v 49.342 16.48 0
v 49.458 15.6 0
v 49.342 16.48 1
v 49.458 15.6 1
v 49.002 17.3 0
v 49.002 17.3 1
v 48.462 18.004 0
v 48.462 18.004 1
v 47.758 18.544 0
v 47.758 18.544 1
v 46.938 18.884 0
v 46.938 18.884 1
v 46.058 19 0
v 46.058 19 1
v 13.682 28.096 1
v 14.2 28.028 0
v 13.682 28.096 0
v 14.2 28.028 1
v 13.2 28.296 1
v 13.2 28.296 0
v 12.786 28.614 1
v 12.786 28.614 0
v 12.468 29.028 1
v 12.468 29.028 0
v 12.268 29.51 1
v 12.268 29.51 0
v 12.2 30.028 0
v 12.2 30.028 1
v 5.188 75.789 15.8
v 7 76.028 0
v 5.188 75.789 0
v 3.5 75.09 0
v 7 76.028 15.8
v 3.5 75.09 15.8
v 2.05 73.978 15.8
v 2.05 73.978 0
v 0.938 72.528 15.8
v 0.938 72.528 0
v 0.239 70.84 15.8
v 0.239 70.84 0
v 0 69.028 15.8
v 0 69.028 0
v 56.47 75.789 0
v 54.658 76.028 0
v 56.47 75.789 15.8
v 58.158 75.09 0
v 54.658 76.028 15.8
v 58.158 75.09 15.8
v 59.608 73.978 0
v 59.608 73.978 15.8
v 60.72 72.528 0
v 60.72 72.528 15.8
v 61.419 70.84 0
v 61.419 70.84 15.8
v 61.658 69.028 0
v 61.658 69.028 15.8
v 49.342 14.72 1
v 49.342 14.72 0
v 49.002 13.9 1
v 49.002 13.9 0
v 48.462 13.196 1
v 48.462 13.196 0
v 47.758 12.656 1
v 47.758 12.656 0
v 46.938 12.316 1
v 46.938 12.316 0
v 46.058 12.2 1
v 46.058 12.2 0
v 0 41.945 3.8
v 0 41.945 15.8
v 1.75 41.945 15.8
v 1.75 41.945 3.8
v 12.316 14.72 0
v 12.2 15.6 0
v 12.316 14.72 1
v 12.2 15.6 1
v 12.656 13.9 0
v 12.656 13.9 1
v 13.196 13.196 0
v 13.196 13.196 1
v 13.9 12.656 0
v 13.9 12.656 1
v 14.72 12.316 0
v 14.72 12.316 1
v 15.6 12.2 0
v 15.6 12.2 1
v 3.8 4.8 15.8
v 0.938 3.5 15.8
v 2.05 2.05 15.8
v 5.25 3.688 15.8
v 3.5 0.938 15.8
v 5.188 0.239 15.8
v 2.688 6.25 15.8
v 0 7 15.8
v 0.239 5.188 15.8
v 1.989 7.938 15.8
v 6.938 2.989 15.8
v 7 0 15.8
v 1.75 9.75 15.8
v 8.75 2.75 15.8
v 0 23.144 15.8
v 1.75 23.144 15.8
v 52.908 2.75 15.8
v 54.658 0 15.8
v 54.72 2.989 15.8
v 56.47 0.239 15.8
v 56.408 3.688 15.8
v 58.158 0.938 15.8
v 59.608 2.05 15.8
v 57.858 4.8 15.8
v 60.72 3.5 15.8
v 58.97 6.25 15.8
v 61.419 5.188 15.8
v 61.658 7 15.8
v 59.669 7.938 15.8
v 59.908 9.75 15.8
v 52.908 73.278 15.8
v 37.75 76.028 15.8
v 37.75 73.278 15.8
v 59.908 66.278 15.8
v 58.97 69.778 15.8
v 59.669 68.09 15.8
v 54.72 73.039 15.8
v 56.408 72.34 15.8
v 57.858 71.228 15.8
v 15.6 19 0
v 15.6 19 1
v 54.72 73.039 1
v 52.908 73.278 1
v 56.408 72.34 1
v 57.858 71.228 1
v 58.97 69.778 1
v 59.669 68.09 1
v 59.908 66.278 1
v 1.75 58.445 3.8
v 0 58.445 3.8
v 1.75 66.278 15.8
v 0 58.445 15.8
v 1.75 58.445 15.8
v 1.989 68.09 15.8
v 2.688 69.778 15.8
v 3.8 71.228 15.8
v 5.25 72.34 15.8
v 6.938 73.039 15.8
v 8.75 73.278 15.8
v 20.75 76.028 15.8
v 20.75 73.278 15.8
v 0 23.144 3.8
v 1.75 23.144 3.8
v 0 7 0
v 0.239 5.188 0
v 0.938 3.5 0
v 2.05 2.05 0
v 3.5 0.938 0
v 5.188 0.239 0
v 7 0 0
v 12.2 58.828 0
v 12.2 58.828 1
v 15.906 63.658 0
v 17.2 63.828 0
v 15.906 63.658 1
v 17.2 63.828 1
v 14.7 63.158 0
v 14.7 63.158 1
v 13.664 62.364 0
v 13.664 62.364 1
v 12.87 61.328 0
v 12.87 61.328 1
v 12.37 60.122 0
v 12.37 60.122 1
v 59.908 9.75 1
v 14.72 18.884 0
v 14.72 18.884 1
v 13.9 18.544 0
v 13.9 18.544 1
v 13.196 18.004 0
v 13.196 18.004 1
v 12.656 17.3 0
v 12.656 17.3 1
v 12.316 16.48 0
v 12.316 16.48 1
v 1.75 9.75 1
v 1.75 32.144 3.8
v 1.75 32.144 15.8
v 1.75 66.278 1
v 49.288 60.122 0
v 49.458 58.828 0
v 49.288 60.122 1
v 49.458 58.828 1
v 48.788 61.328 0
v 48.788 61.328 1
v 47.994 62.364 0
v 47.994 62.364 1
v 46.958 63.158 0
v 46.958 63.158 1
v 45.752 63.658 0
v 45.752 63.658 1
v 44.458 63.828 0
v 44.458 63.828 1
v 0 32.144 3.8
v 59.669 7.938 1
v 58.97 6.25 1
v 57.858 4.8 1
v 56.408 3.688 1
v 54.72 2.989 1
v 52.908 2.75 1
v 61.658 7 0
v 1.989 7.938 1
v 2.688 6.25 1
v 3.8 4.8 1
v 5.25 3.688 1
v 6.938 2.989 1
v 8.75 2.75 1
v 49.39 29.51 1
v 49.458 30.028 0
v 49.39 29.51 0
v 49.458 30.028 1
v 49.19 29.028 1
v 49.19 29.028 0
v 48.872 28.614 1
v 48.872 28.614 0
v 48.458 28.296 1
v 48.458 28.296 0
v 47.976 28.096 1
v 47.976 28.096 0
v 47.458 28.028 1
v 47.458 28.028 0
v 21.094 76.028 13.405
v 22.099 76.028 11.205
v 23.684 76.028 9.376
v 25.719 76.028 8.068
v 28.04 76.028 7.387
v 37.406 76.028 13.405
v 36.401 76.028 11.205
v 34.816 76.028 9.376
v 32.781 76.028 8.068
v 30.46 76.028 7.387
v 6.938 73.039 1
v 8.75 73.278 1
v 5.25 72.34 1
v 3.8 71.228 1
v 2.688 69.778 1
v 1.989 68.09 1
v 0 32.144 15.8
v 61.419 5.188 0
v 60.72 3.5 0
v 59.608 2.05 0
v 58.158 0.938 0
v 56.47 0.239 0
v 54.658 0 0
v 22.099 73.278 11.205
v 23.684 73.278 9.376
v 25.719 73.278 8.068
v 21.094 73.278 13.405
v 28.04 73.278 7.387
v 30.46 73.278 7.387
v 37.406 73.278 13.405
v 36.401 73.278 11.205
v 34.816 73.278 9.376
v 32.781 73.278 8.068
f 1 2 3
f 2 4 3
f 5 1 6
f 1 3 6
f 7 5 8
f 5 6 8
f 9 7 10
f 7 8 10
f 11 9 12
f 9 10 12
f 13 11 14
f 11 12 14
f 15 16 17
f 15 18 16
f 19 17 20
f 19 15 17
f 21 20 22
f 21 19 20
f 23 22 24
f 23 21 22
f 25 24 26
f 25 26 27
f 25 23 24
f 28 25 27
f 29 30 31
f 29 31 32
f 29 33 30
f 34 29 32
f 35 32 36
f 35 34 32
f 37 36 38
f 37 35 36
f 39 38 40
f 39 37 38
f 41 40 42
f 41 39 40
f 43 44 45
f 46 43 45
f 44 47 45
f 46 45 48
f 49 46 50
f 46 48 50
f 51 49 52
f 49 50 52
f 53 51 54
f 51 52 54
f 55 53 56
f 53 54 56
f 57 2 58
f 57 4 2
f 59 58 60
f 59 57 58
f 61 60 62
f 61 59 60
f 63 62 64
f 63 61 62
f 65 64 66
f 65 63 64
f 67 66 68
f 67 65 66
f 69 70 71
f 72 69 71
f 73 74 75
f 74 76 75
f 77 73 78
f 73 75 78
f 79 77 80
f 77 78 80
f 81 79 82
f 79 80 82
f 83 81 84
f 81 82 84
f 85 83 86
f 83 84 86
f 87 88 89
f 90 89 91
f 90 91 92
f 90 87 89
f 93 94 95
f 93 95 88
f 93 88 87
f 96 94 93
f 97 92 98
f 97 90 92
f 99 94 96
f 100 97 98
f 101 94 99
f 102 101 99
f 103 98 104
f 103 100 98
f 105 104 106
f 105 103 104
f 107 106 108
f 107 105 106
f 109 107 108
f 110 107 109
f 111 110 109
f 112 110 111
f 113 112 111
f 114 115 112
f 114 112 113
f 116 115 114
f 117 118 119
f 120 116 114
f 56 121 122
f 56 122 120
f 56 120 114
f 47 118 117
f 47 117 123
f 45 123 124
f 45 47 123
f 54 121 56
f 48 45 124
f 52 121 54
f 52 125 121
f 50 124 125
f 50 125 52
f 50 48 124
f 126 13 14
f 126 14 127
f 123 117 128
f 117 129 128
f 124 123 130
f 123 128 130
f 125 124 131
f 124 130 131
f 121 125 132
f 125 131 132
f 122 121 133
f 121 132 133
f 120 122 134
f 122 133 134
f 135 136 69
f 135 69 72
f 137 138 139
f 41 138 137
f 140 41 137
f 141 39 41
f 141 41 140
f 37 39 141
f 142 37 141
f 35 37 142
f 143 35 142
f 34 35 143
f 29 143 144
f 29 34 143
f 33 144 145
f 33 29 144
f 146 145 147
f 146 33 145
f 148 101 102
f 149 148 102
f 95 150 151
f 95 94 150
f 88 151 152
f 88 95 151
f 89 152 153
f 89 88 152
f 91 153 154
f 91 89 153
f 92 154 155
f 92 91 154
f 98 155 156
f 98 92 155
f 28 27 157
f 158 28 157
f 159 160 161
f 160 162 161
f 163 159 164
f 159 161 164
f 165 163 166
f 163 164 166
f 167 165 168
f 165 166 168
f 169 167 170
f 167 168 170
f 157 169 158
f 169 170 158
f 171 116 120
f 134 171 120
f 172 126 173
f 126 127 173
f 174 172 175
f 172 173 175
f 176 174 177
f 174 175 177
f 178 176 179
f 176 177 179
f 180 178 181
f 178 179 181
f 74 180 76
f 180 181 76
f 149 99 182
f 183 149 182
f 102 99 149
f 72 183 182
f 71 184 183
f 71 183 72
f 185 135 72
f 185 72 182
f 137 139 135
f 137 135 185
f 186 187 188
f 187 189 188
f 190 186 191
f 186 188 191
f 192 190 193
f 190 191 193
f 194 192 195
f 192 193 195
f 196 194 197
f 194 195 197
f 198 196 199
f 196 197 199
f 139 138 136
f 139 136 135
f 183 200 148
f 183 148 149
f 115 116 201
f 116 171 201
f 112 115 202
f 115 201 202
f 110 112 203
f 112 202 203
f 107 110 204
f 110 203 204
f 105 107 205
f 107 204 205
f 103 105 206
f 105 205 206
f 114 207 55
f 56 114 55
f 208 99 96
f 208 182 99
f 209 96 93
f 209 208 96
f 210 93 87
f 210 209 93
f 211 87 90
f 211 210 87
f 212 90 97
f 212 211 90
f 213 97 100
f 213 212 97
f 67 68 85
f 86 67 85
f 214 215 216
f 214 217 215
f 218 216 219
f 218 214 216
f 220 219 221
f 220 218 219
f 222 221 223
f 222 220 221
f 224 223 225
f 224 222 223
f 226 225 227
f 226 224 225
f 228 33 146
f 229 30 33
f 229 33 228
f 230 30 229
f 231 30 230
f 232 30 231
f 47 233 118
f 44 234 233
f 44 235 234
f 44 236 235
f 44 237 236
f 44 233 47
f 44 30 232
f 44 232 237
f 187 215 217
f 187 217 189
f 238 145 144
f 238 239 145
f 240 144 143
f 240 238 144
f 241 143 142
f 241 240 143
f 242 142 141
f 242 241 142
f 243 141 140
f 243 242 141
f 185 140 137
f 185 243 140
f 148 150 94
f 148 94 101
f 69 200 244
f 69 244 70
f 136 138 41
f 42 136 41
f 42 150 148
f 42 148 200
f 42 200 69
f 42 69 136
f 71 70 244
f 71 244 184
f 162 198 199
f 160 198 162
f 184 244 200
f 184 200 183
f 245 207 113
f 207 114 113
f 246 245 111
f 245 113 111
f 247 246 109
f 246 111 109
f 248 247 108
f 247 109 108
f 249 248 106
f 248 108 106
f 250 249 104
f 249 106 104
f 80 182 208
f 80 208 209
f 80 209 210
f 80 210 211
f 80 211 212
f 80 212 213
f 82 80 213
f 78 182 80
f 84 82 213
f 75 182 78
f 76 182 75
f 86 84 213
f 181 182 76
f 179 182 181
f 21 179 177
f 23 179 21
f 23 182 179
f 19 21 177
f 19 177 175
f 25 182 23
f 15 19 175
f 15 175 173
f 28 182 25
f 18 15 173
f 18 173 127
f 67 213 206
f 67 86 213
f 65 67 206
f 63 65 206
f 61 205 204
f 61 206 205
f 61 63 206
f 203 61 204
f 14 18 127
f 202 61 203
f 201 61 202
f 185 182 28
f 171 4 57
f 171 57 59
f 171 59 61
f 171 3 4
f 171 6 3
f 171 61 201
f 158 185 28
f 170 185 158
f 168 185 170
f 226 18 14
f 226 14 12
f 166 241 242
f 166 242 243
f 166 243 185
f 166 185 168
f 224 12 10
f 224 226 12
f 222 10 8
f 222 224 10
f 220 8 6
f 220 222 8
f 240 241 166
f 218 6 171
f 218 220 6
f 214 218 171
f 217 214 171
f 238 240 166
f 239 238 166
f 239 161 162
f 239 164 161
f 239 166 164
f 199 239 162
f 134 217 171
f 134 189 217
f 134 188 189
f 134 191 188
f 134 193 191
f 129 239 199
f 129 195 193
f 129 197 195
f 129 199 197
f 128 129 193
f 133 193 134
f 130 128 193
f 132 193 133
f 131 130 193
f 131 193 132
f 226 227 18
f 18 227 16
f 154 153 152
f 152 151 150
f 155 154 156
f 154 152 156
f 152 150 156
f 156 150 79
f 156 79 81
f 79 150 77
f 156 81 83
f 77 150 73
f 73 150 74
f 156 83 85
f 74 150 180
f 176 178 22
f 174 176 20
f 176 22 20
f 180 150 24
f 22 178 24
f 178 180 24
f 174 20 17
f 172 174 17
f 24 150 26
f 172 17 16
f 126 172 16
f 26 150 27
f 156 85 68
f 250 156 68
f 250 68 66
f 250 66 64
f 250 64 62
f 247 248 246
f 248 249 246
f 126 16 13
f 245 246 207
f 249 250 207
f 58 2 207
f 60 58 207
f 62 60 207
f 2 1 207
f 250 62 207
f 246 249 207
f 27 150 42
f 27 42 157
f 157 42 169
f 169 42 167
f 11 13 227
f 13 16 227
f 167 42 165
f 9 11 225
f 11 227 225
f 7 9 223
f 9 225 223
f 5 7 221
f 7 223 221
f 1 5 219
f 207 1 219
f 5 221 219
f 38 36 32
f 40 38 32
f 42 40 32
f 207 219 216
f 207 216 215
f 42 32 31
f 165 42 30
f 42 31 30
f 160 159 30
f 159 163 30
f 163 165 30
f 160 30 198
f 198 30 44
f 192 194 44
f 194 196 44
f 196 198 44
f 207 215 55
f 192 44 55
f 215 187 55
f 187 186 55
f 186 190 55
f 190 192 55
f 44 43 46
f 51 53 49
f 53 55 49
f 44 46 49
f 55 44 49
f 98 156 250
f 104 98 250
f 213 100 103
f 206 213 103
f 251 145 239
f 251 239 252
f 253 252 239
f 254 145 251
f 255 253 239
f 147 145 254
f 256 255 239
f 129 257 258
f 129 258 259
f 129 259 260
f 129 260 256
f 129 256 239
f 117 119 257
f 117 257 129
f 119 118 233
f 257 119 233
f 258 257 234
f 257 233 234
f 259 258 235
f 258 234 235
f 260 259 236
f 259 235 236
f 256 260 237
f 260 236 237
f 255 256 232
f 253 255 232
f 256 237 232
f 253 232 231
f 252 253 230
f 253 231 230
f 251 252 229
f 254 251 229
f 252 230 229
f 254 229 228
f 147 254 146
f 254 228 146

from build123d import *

# Parameters (mm, degrees)
SKETCH1_W                  = 61.658
SKETCH1_H                  = 76.028
BOSS_EXTRUDE1_DEPTH        = 15.8
SKETCH3_W                  = 58.158
SKETCH3_H                  = 70.528
CUT_EXTRUDE2_DEPTH         = 14.8
FILLET1_R                  = 7
FILLET2_R                  = 7
FILLET3_R                  = 7
SKETCH4_W                  = 1.75
SKETCH4_H                  = 16.5
CUT_EXTRUDE3_SWITCH_DEPTH  = 12
SKETCH5_W                  = 1.75
SKETCH5_H                  = 9
CUT_EXTRUDE4_USB_DEPTH     = 12
SKETCH6_R                  = 8.5
CUT_EXTRUDE4_SONIC_DEPTH   = 2.75
SKETCH7_W                  = 37.258
SKETCH7_H                  = 35.8
CUT_EXTRUDE5_LCDMAIN_DEPTH = 1
SKETCH8_W                  = 37.258
SKETCH8_H                  = 6.8
CUT_EXTRUDE6_LCDNOTI_DEPTH = 1
FILLET4_R                  = 5
FILLET5_R                  = 2
FILLET6_R                  = 3.4


with BuildPart() as part:
    # Sketch1 → Boss-Extrude1 (new body)
    with BuildSketch(Plane.XY):
        with Locations((30.829, 38.014)):
            Rectangle(SKETCH1_W, SKETCH1_H)
    extrude(amount=BOSS_EXTRUDE1_DEPTH)

    # Sketch3 → Cut-Extrude2 (cut)
    with BuildSketch(Plane.XY.offset(15.8)):
        with Locations((30.829, 38.014)):
            Rectangle(SKETCH3_W, SKETCH3_H)
    extrude(amount=-CUT_EXTRUDE2_DEPTH, mode=Mode.SUBTRACT)

    # Fillet1
    fillet1_edges = [part.edges().sort_by_distance(p)[0] for p in [
        (61.658, 76.028, 7.9),
    ]]
    fillet(fillet1_edges, radius=FILLET1_R)

    # Fillet2
    fillet2_edges = [part.edges().sort_by_distance(p)[0] for p in [
        (1.75, 73.278, 8.4),
        (61.658, 0, 7.9),
        (0, 0, 7.9),
    ]]
    fillet(fillet2_edges, radius=FILLET2_R)

    # Fillet3
    fillet3_edges = [part.edges().sort_by_distance(p)[0] for p in [
        (1.75, 2.75, 8.4),
        (59.908, 73.278, 8.4),
        (59.908, 2.75, 8.4),
        (0, 76.028, 7.9),
    ]]
    fillet(fillet3_edges, radius=FILLET3_R)

    # Sketch4 → Cut-Extrude3_switch (cut)
    with BuildSketch(Plane.XY.offset(15.8)):
        with Locations((0.875, 50.194669907)):
            Rectangle(SKETCH4_W, SKETCH4_H)
    extrude(amount=-CUT_EXTRUDE3_SWITCH_DEPTH, mode=Mode.SUBTRACT)

    # Sketch5 → Cut-Extrude4_usb (cut)
    with BuildSketch(Plane.XY.offset(15.8)):
        with Locations((0.875, 27.643981113)):
            Rectangle(SKETCH5_W, SKETCH5_H)
    extrude(amount=-CUT_EXTRUDE4_USB_DEPTH, mode=Mode.SUBTRACT)

    # Sketch6 → Cut-Extrude4_sonic (cut)
    with BuildSketch(Plane(origin=(0, 76.028, 0), x_dir=(1, 0, 0), z_dir=(0, 1, 0))):
        with Locations((29.25, -15.8)):
            Circle(SKETCH6_R)
    extrude(amount=-CUT_EXTRUDE4_SONIC_DEPTH, mode=Mode.SUBTRACT)

    # Sketch7 → Cut-Extrude5_LcdMain (cut)
    with BuildSketch(Plane(origin=(0, 0, 0), x_dir=(-1, 0, 0), z_dir=(0, 0, -1))):
        with Locations((-30.829, 45.928)):
            Rectangle(SKETCH7_W, SKETCH7_H)
    extrude(amount=-CUT_EXTRUDE5_LCDMAIN_DEPTH, mode=Mode.SUBTRACT)

    # Sketch8 → Cut-Extrude6_LcdNoti (cut)
    with BuildSketch(Plane(origin=(0, 0, 0), x_dir=(-1, 0, 0), z_dir=(0, 0, -1))):
        with Locations((-30.829, 15.6)):
            Rectangle(SKETCH8_W, SKETCH8_H)
    extrude(amount=-CUT_EXTRUDE6_LCDNOTI_DEPTH, mode=Mode.SUBTRACT)

    # Fillet4
    fillet4_edges = [part.edges().sort_by_distance(p)[0] for p in [
        (49.458, 63.828, 0.5),
        (12.2, 63.828, 0.5),
    ]]
    fillet(fillet4_edges, radius=FILLET4_R)

    # Fillet5
    fillet5_edges = [part.edges().sort_by_distance(p)[0] for p in [
        (49.458, 28.028, 0.5),
        (12.2, 28.028, 0.5),
    ]]
    fillet(fillet5_edges, radius=FILLET5_R)

    # Fillet6
    fillet6_edges = [part.edges().sort_by_distance(p)[0] for p in [
        (12.2, 12.2, 0.5),
        (12.2, 19, 0.5),
        (49.458, 19, 0.5),
        (49.458, 12.2, 0.5),
    ]]
    fillet(fillet6_edges, radius=FILLET6_R - 0.0001)  # a hair under: the kernel refuses the full size


solid = part.part
